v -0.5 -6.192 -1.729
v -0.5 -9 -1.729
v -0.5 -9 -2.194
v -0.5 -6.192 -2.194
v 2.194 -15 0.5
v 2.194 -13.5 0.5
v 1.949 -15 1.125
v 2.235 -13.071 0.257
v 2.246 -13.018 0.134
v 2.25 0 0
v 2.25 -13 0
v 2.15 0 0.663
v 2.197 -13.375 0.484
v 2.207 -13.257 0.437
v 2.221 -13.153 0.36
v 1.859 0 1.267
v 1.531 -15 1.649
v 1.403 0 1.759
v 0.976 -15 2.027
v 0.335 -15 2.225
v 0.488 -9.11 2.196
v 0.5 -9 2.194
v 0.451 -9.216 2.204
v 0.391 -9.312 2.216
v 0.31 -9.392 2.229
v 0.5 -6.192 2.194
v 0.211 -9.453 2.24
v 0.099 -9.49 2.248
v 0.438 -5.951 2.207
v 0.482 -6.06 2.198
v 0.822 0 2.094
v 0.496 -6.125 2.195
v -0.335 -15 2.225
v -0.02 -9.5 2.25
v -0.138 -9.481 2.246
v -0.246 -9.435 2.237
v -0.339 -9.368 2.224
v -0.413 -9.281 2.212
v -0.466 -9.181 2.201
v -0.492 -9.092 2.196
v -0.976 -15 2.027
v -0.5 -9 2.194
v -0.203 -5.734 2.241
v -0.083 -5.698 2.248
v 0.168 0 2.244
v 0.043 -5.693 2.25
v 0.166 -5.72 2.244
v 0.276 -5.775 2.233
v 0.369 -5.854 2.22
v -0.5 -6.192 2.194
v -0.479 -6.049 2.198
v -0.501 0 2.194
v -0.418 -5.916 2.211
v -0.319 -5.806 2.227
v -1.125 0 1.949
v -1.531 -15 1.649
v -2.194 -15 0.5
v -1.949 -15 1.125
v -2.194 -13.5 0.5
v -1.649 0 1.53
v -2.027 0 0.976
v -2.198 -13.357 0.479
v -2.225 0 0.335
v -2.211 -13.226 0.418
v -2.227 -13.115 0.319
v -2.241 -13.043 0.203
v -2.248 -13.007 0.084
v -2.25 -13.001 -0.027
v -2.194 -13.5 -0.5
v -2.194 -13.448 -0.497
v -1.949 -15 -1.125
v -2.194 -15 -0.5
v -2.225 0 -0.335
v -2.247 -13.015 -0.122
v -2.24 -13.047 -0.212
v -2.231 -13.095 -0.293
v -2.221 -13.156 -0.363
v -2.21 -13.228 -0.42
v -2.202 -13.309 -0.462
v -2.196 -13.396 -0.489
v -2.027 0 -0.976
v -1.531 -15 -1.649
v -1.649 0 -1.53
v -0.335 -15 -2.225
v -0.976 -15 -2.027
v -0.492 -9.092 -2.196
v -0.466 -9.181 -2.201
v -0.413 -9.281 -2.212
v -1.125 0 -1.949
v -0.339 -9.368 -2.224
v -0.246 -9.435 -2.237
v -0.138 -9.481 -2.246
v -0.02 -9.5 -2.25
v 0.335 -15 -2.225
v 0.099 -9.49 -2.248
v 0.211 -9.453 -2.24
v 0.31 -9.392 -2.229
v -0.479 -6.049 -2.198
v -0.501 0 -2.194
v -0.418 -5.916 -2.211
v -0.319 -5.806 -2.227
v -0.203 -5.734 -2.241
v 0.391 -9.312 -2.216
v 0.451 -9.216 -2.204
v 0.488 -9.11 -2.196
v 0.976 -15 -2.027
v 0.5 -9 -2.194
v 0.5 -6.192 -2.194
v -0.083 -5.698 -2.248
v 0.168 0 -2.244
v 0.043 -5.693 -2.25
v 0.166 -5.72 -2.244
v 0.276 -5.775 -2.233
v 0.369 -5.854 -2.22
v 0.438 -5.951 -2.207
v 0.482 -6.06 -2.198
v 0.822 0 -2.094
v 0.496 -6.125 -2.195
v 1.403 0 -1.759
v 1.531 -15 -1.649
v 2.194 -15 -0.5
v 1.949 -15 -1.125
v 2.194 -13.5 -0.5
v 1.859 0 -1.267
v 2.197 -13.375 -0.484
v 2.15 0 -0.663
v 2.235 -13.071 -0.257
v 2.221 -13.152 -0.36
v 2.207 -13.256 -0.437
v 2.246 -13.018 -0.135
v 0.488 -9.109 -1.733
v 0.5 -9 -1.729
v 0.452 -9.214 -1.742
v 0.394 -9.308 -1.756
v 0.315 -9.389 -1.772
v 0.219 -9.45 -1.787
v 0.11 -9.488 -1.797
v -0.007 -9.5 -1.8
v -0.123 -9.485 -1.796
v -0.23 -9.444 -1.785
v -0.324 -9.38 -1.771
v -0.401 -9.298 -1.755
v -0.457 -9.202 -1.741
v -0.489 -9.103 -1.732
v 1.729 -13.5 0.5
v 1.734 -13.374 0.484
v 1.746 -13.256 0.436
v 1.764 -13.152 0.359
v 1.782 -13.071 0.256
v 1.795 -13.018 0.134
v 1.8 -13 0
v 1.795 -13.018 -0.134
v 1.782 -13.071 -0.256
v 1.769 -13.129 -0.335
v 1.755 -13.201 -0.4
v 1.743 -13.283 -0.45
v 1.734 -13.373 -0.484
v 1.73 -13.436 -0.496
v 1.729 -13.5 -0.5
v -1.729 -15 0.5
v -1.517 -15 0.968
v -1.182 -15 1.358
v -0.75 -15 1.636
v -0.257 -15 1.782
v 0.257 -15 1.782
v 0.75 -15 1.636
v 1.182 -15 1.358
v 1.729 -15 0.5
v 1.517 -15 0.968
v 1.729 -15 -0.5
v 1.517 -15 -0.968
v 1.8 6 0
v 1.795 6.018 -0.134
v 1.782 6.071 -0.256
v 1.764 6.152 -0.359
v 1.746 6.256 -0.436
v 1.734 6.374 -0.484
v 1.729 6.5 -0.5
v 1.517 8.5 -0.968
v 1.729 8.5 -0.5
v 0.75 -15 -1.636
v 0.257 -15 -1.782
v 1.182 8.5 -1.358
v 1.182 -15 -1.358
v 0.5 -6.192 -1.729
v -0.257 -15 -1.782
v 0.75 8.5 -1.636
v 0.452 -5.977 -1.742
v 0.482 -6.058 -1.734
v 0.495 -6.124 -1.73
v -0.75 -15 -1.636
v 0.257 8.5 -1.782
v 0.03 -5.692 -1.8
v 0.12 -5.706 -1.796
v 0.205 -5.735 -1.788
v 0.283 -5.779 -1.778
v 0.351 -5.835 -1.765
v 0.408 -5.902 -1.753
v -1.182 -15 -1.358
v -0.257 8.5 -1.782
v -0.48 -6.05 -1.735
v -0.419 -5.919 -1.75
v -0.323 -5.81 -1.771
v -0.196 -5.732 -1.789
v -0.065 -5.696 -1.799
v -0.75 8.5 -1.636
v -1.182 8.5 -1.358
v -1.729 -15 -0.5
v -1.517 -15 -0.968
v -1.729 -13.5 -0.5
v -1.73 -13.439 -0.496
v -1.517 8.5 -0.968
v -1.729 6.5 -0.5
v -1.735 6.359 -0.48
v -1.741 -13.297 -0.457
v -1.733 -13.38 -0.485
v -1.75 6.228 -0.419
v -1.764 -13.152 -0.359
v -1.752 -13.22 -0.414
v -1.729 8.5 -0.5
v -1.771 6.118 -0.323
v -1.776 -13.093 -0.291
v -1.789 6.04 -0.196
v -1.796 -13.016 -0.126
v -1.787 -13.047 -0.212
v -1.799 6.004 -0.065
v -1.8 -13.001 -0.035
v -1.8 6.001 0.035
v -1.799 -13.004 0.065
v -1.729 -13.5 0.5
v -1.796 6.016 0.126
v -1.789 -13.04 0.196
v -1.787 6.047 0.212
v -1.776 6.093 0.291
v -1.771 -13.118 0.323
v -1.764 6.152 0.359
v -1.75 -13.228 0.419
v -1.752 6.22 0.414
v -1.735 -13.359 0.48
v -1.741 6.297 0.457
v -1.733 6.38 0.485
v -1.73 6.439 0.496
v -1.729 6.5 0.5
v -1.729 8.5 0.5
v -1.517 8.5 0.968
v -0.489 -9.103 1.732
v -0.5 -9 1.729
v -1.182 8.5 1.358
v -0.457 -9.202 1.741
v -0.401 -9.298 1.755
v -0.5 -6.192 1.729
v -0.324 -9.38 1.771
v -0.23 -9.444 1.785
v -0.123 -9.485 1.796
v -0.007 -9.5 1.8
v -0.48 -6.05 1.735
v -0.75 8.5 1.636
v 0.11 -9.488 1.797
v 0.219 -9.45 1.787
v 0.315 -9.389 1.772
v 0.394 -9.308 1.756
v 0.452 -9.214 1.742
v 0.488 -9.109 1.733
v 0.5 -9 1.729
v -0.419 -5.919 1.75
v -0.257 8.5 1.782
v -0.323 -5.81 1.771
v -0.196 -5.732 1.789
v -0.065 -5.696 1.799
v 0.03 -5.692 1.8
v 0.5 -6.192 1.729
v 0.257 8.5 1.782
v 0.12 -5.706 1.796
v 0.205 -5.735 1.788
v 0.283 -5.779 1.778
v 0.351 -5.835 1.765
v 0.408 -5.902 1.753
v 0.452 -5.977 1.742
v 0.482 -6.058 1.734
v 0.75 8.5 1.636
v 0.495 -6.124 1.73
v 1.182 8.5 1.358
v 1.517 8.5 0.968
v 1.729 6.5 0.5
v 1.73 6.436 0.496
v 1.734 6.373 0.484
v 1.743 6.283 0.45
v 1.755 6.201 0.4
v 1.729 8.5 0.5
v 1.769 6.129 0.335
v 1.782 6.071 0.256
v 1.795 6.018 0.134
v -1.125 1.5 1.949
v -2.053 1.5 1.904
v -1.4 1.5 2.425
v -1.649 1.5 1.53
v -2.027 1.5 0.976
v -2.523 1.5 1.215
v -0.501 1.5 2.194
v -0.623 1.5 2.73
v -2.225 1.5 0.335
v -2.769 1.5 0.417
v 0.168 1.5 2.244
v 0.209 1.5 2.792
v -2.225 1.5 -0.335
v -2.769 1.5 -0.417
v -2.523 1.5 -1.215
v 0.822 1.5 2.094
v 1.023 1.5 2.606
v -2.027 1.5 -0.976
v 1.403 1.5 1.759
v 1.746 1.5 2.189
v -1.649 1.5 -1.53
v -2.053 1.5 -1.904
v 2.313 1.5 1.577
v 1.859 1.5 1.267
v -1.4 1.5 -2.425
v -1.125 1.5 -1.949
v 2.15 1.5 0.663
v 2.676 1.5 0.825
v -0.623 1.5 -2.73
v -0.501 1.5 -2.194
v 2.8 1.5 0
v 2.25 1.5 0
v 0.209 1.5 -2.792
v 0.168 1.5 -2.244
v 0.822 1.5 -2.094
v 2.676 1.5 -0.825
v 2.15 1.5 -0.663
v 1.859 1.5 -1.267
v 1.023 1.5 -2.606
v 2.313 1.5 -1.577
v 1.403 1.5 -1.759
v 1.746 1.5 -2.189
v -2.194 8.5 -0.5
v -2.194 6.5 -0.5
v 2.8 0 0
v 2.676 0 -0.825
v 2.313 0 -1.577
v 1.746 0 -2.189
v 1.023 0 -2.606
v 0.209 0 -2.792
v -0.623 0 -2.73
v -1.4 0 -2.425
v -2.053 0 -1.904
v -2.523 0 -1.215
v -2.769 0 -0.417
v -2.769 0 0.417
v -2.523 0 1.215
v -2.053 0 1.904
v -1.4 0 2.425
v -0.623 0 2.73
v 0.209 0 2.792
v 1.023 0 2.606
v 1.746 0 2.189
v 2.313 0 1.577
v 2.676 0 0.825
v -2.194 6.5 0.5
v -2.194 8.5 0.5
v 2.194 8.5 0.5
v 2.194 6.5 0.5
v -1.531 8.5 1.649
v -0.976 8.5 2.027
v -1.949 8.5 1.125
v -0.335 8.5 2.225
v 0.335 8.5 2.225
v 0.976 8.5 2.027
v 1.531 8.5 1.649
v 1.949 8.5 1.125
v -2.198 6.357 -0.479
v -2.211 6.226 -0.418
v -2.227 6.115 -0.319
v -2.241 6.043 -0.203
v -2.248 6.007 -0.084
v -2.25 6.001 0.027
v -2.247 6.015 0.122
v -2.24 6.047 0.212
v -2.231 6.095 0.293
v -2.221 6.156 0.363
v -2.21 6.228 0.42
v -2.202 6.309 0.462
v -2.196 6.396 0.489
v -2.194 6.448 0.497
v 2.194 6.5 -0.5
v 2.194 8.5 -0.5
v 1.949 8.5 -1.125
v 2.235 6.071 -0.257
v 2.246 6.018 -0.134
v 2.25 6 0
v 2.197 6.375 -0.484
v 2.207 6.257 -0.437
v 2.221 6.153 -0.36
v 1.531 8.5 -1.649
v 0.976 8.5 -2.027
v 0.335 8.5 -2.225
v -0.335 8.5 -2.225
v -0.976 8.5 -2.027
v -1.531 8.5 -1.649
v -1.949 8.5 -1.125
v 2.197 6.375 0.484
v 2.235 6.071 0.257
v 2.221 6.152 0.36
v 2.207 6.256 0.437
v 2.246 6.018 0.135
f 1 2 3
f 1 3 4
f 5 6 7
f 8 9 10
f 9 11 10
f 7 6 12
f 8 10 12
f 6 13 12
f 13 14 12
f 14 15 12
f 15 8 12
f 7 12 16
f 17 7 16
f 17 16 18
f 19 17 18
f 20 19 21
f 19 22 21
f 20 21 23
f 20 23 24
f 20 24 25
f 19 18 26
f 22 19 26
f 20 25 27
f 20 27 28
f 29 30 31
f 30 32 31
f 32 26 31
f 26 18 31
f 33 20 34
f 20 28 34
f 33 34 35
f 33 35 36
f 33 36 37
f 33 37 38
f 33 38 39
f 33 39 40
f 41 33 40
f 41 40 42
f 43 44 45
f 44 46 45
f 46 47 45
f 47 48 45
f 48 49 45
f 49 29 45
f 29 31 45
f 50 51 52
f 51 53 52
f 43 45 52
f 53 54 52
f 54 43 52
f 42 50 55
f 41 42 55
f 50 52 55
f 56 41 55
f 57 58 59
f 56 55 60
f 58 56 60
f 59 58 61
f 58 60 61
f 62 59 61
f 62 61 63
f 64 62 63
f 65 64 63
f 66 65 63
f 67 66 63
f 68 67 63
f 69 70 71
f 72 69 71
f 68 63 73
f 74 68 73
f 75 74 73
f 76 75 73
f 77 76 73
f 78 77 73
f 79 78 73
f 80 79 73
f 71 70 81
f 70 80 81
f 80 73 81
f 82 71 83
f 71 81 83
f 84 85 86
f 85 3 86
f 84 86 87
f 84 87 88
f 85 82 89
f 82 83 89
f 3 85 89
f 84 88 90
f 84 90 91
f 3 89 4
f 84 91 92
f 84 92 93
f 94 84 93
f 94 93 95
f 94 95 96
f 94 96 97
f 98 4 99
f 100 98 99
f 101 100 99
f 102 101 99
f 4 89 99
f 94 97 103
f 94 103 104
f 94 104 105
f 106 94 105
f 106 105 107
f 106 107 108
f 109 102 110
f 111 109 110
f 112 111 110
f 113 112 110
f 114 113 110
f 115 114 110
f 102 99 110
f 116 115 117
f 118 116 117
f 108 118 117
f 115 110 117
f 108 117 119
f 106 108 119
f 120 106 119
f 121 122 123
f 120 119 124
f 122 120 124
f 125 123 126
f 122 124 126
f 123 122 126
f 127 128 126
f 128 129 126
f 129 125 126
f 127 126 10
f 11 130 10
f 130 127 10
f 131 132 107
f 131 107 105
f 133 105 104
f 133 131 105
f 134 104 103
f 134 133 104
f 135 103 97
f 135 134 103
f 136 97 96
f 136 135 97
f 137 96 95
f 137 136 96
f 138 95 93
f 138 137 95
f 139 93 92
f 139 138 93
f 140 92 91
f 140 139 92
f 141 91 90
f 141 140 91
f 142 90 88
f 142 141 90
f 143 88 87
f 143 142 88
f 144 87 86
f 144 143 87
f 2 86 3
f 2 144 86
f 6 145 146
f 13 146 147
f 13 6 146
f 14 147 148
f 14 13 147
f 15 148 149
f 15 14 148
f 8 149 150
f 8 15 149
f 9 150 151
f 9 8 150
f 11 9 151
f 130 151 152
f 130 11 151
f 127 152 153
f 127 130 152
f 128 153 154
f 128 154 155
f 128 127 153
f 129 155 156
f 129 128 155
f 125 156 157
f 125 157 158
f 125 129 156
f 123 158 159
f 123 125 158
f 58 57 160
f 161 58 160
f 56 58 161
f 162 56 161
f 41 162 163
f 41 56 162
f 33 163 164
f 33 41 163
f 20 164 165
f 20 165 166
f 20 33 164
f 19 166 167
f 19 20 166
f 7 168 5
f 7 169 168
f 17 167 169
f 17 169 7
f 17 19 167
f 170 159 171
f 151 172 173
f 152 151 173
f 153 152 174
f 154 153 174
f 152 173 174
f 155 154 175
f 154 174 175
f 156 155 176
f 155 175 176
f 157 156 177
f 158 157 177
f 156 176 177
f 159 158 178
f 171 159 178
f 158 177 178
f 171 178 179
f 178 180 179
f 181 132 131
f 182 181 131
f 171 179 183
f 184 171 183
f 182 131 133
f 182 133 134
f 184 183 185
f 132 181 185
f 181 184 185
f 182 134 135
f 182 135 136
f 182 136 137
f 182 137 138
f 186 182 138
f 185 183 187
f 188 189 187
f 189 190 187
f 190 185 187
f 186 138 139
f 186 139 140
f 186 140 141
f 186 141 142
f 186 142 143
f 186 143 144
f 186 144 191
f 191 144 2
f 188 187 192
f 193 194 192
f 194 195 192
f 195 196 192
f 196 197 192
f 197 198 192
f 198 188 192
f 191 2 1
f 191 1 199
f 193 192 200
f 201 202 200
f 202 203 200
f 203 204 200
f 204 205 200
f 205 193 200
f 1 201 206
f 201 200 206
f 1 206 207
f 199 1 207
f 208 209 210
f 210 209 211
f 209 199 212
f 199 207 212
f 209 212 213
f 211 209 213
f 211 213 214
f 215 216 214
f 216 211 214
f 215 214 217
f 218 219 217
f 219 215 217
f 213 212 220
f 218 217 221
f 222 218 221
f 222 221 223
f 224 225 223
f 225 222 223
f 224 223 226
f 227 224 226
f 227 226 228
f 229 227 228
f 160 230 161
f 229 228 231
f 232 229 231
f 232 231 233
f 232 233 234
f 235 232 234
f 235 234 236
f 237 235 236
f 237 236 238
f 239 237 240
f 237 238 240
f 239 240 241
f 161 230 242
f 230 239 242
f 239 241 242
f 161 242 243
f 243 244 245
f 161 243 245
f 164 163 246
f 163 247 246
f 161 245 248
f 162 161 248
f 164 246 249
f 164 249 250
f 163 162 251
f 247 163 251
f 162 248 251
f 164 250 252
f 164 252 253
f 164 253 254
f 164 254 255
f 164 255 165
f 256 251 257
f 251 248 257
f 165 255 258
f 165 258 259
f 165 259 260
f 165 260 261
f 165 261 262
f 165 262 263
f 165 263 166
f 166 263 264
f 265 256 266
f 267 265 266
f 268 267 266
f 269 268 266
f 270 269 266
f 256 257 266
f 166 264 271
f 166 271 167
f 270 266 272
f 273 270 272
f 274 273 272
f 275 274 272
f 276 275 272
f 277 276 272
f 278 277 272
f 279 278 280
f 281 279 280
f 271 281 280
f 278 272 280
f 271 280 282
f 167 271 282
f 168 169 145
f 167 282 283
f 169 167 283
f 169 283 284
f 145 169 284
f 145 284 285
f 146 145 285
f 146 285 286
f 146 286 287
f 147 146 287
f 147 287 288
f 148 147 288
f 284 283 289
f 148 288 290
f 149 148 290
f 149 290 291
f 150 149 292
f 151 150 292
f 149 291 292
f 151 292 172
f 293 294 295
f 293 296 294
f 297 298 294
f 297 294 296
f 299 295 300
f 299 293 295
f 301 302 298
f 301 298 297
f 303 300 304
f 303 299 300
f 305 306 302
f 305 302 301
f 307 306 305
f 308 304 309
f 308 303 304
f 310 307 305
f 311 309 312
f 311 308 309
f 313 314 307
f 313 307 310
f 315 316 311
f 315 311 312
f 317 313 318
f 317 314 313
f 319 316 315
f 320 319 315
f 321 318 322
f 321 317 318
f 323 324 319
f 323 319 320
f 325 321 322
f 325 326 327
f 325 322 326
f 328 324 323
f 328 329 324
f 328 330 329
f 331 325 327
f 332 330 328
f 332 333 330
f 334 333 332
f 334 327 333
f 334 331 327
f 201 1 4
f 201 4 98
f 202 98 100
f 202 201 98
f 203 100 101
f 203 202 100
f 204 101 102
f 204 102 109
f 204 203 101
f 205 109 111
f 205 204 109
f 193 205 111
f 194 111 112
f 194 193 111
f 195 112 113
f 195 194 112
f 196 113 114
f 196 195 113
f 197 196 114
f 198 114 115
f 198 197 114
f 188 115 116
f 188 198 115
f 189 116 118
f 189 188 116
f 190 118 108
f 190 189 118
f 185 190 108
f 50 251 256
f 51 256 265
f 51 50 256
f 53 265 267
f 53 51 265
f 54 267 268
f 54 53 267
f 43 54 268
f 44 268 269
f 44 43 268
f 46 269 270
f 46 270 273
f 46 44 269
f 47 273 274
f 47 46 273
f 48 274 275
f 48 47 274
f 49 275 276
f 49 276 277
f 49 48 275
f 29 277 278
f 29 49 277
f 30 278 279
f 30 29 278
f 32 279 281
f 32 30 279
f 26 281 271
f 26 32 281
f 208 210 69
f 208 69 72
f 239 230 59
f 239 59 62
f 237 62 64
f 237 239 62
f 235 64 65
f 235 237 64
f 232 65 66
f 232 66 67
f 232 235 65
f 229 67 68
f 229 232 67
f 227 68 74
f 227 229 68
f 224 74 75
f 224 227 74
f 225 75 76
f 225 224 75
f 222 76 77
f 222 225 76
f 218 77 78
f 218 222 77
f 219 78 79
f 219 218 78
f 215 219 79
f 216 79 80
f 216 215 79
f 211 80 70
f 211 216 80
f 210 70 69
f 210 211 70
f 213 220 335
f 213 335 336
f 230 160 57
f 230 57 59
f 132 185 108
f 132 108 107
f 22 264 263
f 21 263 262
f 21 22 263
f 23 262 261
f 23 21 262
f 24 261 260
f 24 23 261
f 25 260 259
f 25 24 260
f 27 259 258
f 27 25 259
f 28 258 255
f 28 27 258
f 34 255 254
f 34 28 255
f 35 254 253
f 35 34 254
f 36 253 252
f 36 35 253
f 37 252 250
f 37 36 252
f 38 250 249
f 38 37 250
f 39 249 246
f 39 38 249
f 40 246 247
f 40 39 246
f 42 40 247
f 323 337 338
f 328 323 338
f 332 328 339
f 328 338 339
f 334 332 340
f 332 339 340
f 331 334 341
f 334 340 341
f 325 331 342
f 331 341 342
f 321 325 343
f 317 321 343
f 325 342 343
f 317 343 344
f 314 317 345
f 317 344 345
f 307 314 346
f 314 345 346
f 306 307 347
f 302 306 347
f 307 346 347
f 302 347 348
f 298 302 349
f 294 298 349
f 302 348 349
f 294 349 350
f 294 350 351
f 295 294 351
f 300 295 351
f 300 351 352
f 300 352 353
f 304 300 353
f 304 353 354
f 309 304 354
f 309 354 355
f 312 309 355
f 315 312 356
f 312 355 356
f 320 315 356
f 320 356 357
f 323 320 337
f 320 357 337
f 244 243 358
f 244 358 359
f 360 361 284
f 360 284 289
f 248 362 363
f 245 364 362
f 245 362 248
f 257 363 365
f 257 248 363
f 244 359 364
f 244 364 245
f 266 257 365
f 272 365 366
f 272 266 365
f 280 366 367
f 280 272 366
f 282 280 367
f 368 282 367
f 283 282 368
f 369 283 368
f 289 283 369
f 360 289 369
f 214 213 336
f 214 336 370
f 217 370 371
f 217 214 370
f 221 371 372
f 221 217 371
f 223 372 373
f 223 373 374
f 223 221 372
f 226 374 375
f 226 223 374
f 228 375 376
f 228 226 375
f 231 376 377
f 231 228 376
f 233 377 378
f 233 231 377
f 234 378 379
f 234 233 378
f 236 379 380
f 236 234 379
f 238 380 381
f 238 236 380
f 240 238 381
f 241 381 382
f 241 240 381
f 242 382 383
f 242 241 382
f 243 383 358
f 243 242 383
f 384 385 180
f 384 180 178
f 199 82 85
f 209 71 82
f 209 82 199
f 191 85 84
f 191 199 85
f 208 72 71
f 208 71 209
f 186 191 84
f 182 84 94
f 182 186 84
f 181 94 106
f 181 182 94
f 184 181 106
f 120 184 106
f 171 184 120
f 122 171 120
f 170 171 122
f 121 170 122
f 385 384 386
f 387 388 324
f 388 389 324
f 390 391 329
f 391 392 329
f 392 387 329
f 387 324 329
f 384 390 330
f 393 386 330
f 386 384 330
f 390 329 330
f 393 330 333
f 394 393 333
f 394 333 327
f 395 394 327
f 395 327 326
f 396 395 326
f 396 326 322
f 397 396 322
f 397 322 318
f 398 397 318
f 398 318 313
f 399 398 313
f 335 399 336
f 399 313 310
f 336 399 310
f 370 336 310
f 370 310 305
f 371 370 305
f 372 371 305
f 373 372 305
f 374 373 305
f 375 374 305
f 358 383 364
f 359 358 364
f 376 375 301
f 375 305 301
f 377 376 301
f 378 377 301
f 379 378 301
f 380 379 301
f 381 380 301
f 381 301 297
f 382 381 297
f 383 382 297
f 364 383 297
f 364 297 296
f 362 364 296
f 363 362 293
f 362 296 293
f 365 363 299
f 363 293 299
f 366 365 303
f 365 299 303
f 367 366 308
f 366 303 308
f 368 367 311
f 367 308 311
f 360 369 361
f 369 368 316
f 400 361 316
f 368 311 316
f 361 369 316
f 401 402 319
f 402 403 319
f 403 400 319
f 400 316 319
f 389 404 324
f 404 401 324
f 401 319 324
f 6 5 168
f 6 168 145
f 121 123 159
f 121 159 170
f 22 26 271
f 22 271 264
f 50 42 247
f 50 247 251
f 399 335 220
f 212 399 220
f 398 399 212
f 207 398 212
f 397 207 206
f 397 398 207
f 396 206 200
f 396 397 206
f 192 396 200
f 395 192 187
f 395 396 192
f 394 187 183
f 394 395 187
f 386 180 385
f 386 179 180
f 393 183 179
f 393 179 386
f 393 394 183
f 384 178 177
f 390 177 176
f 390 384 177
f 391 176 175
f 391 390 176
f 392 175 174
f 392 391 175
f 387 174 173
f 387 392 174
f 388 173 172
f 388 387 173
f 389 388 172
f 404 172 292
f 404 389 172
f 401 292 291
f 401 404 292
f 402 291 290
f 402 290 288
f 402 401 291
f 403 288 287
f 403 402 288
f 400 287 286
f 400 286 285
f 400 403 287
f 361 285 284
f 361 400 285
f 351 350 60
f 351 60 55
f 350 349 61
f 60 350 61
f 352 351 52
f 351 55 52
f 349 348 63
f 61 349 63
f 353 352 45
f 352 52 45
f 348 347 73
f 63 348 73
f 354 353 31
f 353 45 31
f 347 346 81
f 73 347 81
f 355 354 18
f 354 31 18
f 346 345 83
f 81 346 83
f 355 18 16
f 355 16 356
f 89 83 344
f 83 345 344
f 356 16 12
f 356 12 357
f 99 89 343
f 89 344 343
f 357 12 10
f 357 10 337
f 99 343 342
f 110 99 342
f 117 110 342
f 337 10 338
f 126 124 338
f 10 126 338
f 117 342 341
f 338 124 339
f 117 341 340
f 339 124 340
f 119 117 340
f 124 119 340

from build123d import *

# Parameters (mm, degrees)
SKETCH1_R           = 2.8
BOSS_EXTRUDE1_DEPTH = 1.5
SKETCH2_R           = 2.25
BOSS_EXTRUDE2_DEPTH = 7
SKETCH3_R           = 2.25
BOSS_EXTRUDE3_DEPTH = 15
CUT_EXTRUDE1_DEPTH  = 103.8
SKETCH5_R           = 1.8
CUT_EXTRUDE2_DEPTH  = 116.0000001
CUT_EXTRUDE3_DEPTH  = 13.8


with BuildPart() as part:
    # Sketch1 → Boss-Extrude1 (new body)
    with BuildSketch(Plane(origin=(0, 0, 0), x_dir=(1, 0, 0), z_dir=(0, 1, 0))):
        Circle(SKETCH1_R)
    extrude(amount=BOSS_EXTRUDE1_DEPTH)

    # Sketch2 → Boss-Extrude2 (add)
    with BuildSketch(Plane(origin=(0, 1.5, 0), x_dir=(1, 0, 0), z_dir=(0, 1, 0))):
        Circle(SKETCH2_R)
    extrude(amount=BOSS_EXTRUDE2_DEPTH)

    # Sketch3 → Boss-Extrude3 (add)
    with BuildSketch(Plane.XZ):
        Circle(SKETCH3_R)
    extrude(amount=BOSS_EXTRUDE3_DEPTH)

    # Sketch4 → Cut-Extrude1 (cut, through all)
    with BuildSketch(Plane(origin=(100, 0, 0), x_dir=(0, 0, -1), z_dir=(1, 0, 0))):
        with BuildLine():
            Line((0.5, -13.5), (0.5, -15))
            ThreePointArc((0.5, -15), (0, -15.5), (-0.5, -15))
            Line((-0.5, -15), (-0.5, -13.5))
            ThreePointArc((-0.5, -13.5), (0, -13), (0.5, -13.5))
        make_face()
        with BuildLine():
            Line((-0.5, 6.5), (-0.5, 8.5))
            ThreePointArc((-0.5, 8.5), (0, 9), (0.5, 8.5))
            Line((0.5, 8.5), (0.5, 6.5))
            ThreePointArc((0.5, 6.5), (0, 6), (-0.5, 6.5))
        make_face()
    extrude(amount=-CUT_EXTRUDE1_DEPTH, mode=Mode.SUBTRACT)

    # Sketch5 → Cut-Extrude2 (cut, through all)
    with BuildSketch(Plane(origin=(0, 100, 0), x_dir=(1, 0, 0), z_dir=(0, 1, 0))):
        Circle(SKETCH5_R)
    extrude(amount=-CUT_EXTRUDE2_DEPTH, mode=Mode.SUBTRACT)

    # Sketch6 → Cut-Extrude3 (cut, through all)
    with BuildSketch(Plane.XY.offset(10)):
        with BuildLine():
            Line((-0.5, -9), (-0.5, -6.191505656))
            ThreePointArc((-0.5, -6.191505656), (0, -5.691505656), (0.5, -6.191505656))
            Line((0.5, -6.191505656), (0.5, -9))
            ThreePointArc((0.5, -9), (0, -9.5), (-0.5, -9))
        make_face()
    extrude(amount=-CUT_EXTRUDE3_DEPTH, mode=Mode.SUBTRACT)


solid = part.part
